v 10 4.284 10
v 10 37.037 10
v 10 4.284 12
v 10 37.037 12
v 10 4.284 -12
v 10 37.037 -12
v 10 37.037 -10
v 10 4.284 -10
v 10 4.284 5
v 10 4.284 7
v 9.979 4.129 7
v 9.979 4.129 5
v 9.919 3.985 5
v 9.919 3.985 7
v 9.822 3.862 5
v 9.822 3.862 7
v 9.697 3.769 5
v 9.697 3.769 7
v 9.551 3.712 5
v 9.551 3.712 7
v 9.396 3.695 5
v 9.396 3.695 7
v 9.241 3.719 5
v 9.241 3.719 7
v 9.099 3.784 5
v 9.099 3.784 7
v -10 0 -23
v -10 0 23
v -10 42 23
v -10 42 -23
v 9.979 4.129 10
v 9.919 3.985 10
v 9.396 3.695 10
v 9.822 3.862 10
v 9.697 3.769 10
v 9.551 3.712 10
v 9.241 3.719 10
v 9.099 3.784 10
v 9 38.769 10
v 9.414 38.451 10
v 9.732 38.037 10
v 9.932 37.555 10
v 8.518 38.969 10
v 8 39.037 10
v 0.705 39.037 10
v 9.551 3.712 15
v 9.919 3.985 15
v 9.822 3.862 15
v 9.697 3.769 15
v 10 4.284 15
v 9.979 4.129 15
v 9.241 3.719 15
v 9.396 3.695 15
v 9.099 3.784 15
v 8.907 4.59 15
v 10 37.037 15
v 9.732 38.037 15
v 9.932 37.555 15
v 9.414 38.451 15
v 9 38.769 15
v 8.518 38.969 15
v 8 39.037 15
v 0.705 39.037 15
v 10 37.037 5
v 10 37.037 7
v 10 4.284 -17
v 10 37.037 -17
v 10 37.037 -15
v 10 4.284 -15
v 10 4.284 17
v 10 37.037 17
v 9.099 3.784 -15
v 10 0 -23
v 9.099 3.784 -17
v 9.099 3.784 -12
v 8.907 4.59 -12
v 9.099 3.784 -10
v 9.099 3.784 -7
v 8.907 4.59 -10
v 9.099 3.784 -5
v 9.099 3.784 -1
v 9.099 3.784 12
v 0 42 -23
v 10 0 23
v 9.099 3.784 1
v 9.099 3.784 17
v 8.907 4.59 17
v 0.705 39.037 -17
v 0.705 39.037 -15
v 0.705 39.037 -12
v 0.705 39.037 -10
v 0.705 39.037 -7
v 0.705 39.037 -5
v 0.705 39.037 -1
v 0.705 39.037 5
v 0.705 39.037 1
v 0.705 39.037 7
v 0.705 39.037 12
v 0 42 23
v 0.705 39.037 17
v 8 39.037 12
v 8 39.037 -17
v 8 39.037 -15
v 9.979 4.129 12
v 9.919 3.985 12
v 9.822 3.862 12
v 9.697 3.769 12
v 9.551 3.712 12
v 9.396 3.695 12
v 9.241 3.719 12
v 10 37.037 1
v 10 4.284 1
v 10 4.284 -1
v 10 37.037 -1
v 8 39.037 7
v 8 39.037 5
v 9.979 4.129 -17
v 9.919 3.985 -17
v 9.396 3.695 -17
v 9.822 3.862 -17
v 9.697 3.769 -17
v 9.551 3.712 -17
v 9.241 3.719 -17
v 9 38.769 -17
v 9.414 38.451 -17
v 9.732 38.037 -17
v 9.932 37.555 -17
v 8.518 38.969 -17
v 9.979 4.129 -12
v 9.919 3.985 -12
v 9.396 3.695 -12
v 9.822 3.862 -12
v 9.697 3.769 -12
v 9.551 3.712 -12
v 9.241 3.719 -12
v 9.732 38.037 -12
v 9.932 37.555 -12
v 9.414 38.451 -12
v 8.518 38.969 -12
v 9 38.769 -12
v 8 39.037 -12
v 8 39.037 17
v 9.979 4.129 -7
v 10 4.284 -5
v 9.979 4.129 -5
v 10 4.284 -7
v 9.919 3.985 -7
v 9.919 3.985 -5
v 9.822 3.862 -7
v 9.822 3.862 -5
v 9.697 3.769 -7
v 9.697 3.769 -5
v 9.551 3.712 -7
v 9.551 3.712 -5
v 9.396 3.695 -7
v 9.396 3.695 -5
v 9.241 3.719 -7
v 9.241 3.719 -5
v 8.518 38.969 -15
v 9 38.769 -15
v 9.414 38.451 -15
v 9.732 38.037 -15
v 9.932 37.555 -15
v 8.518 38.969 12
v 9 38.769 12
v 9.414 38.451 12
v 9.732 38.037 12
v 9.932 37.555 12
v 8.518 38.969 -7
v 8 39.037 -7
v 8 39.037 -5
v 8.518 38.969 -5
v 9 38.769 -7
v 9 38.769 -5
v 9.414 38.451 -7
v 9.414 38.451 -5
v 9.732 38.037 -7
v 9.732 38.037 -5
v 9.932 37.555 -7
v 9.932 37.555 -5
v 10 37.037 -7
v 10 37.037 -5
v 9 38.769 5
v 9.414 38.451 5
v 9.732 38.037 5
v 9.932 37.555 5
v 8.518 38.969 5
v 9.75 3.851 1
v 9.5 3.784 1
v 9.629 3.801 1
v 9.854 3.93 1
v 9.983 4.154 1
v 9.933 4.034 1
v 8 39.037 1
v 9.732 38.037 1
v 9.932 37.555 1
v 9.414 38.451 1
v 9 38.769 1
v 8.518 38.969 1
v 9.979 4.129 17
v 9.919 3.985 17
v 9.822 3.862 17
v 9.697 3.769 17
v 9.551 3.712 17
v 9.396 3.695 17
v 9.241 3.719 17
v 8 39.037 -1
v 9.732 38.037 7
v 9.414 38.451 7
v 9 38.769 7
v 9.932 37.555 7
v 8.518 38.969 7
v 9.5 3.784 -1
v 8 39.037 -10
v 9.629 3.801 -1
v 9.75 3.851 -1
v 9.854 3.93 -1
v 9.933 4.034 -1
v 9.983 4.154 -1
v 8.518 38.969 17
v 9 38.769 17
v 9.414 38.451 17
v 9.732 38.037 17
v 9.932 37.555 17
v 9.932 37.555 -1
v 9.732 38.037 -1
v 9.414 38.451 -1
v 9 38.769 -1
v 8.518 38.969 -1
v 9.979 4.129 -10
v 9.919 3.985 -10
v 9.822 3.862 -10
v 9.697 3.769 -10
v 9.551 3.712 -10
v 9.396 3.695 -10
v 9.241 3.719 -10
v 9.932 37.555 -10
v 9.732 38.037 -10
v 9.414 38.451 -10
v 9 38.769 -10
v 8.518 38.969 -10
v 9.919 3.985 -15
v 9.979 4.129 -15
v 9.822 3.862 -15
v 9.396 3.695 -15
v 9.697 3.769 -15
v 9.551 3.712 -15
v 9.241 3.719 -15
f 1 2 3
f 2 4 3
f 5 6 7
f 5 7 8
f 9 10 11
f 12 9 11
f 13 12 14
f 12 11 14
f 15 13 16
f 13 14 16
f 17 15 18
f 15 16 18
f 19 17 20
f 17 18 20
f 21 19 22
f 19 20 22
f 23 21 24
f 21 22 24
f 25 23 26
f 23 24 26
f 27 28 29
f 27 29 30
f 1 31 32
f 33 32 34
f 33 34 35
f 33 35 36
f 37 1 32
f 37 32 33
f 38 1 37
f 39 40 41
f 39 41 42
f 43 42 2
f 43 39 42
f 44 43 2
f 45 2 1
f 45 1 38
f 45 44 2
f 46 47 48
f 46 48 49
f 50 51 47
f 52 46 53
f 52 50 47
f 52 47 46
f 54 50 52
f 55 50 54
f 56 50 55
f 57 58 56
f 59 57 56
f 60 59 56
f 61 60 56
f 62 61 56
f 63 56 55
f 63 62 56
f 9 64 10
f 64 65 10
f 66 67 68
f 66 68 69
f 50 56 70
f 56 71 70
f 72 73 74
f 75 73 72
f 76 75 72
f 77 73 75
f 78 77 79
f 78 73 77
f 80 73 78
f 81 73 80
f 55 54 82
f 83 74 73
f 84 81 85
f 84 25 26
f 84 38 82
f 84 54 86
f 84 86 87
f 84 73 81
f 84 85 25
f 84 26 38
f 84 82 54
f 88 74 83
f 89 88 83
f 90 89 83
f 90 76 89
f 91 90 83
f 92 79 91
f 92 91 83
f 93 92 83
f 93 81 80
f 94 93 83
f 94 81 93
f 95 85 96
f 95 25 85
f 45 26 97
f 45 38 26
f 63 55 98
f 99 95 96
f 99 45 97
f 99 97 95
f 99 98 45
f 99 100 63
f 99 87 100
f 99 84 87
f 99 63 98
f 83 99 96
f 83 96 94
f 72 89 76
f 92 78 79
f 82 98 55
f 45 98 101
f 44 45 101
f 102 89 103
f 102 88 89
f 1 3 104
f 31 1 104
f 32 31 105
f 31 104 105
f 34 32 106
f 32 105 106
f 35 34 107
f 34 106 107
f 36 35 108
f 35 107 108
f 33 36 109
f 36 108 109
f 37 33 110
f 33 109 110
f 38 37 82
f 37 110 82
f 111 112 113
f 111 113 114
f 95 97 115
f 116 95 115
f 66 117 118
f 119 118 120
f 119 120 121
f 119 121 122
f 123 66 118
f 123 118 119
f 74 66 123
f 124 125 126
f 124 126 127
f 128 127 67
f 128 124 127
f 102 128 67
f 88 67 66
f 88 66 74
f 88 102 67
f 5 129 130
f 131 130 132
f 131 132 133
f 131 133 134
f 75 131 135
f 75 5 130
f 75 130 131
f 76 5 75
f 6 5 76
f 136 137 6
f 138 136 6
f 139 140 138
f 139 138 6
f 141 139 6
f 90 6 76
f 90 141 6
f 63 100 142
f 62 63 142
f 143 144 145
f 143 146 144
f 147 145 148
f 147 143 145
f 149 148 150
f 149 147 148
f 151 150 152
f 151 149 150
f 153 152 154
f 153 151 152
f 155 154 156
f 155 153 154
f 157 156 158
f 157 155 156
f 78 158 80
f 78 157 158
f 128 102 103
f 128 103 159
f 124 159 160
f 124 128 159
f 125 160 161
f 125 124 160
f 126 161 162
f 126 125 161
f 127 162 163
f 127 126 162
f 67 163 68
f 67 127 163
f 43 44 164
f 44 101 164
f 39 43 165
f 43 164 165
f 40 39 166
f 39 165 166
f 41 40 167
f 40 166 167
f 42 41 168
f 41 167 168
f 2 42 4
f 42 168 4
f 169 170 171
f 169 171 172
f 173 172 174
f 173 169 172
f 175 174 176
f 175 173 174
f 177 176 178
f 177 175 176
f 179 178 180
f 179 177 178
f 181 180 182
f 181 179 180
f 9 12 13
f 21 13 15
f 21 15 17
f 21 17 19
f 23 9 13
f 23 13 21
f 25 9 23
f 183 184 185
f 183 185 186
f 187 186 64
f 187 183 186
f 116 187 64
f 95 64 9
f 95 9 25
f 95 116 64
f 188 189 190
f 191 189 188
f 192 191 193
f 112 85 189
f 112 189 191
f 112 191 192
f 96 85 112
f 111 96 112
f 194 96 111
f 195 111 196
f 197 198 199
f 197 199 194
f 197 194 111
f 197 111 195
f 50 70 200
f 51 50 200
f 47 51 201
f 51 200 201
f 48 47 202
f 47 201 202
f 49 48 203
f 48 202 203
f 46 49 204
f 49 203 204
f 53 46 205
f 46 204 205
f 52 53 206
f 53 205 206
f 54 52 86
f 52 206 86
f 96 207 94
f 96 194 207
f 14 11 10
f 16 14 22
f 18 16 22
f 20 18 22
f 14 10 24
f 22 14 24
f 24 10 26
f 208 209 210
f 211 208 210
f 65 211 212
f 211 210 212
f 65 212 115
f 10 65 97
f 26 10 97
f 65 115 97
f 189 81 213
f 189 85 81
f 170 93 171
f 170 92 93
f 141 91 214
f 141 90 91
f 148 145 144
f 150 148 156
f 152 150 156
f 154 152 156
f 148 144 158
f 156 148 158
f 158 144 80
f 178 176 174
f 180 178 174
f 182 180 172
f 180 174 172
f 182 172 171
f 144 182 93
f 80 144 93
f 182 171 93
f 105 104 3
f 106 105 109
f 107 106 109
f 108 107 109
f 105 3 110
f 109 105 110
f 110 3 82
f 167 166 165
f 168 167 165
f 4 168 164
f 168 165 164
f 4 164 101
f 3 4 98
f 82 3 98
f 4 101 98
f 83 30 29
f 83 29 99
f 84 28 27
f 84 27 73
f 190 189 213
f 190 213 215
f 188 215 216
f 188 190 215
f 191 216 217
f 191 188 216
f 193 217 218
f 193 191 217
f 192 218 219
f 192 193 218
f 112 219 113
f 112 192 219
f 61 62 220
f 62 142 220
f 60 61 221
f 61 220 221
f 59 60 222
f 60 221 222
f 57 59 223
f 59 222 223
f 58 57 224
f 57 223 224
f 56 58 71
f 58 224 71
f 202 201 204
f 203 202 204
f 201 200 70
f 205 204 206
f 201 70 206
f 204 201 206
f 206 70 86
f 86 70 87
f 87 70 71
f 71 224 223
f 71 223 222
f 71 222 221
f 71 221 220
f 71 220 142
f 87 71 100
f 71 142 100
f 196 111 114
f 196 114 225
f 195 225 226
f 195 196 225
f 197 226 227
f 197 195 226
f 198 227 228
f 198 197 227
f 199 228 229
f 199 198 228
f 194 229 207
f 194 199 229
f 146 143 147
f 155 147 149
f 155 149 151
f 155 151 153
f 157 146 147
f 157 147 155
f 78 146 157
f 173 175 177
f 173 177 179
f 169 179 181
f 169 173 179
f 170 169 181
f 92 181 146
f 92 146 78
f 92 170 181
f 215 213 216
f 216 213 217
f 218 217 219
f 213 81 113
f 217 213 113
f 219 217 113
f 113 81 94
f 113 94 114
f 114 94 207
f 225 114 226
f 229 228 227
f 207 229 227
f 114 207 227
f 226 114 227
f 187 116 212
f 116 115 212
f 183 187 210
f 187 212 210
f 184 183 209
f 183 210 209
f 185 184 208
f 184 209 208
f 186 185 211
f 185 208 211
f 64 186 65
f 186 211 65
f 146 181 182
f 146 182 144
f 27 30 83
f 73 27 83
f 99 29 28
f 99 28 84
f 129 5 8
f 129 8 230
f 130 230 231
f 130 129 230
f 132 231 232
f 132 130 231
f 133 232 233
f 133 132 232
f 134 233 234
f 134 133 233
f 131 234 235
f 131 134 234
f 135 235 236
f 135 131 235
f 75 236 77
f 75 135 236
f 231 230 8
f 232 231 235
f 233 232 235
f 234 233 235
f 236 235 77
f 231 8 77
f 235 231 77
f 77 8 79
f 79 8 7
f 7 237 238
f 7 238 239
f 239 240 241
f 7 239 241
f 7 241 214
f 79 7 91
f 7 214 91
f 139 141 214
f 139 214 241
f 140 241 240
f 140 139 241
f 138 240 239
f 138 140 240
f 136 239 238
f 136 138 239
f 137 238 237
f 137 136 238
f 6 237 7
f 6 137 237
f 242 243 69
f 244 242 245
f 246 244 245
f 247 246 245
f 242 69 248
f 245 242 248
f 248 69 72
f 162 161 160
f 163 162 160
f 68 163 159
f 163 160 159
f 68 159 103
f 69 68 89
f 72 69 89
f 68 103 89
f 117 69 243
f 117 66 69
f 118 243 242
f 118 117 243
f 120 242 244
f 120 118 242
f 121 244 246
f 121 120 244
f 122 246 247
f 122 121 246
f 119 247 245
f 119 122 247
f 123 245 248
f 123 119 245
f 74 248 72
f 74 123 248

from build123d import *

# Parameters (mm, degrees)
CROQUIS1_W               = 20
CROQUIS1_H               = 46
SALIENTE_EXTRUIR1_DEPTH  = 42
CORTAR_EXTRUIR1_DEPTH    = 64.087241182
SALIENTE_EXTRUIR4_DEPTH  = 1
SALIENTE_EXTRUIR5_DEPTH  = 1
SALIENTE_EXTRUIR6_DEPTH  = 1
SALIENTE_EXTRUIR7_DEPTH  = 1
SALIENTE_EXTRUIR8_DEPTH  = 1
SALIENTE_EXTRUIR9_DEPTH  = 1
SALIENTE_EXTRUIR10_DEPTH = 1


with BuildPart() as part:
    # Croquis1 → Saliente-Extruir1 (new body)
    with BuildSketch(Plane(origin=(0, 0, 0), x_dir=(1, 0, 0), z_dir=(0, 1, 0))):
        Rectangle(CROQUIS1_W, CROQUIS1_H)
    extrude(amount=SALIENTE_EXTRUIR1_DEPTH)

    # Croquis2 → Cortar-Extruir1 (cut, through all)
    with BuildSketch(Plane.XY.offset(23)):
        Polygon((10, 0), (-0.19167841, 42.803384109), (10, 42), align=None)
    extrude(amount=-CORTAR_EXTRUIR1_DEPTH, mode=Mode.SUBTRACT)

    # Croquis3 → Saliente-Extruir4 (add, symmetric)
    with BuildSketch(Plane.XY):
        with BuildLine():
            Line((9.099065282, 3.783778611), (9.5, 3.783778611))
            ThreePointArc((9.5, 3.783778611), (9.853553391, 3.93022522), (10, 4.283778611))
            Line((10, 4.283778611), (10, 37.037089462))
            ThreePointArc((10, 37.037089462), (9.414213562, 38.451303024), (8, 39.037089462))
            Line((8, 39.037089462), (0.705093297, 39.037089462))
            Line((0.705093297, 39.037089462), (9.099065282, 3.783778611))
        make_face()
    extrude(amount=SALIENTE_EXTRUIR4_DEPTH, both=True)

    # Croquis5 → Saliente-Extruir5 (add, symmetric)
    with BuildSketch(Plane.XY.offset(6)):
        with BuildLine():
            Line((0.705093297, 39.037089462), (8, 39.037089462))
            ThreePointArc((8, 39.037089462), (9.414213562, 38.451303024), (10, 37.037089462))
            Line((10, 37.037089462), (10, 4.283778611))
            ThreePointArc((10, 4.283778611), (9.696707623, 3.768588508), (9.099065282, 3.783778611))
            Line((9.099065282, 3.783778611), (0.705093297, 39.037089462))
        make_face()
    extrude(amount=SALIENTE_EXTRUIR5_DEPTH, both=True)

    # Croquis6 → Saliente-Extruir6 (add, symmetric)
    with BuildSketch(Plane.XY.offset(11)):
        with BuildLine():
            Line((0.705093297, 39.037089462), (8, 39.037089462))
            ThreePointArc((8, 39.037089462), (9.414213562, 38.451303024), (10, 37.037089462))
            Line((10, 37.037089462), (10, 4.283778611))
            ThreePointArc((10, 4.283778611), (9.696707623, 3.768588508), (9.099065282, 3.783778611))
            Line((9.099065282, 3.783778611), (0.705093297, 39.037089462))
        make_face()
    extrude(amount=SALIENTE_EXTRUIR6_DEPTH, both=True)

    # Croquis7 → Saliente-Extruir7 (add, symmetric)
    with BuildSketch(Plane.XY.offset(16)):
        with BuildLine():
            Line((0.705093297, 39.037089462), (8, 39.037089462))
            ThreePointArc((8, 39.037089462), (9.414213562, 38.451303024), (10, 37.037089462))
            Line((10, 37.037089462), (10, 4.283778611))
            ThreePointArc((10, 4.283778611), (9.251976893, 3.716372197), (8.907184659, 4.589645878))
            Line((8.907184659, 4.589645878), (0.705093297, 39.037089462))
        make_face()
    extrude(amount=SALIENTE_EXTRUIR7_DEPTH, both=True)

    # Croquis9 → Saliente-Extruir8 (add, symmetric)
    with BuildSketch(Plane(origin=(0, 0, -6), x_dir=(-1, 0, 0), z_dir=(0, 0, -1))):
        with BuildLine():
            Line((-0.705093297, 39.037089462), (-8, 39.037089462))
            ThreePointArc((-8, 39.037089462), (-9.414213562, 38.451303024), (-10, 37.037089462))
            Line((-10, 37.037089462), (-10, 4.283778611))
            ThreePointArc((-10, 4.283778611), (-9.696707623, 3.768588508), (-9.099065282, 3.783778611))
            Line((-9.099065282, 3.783778611), (-0.705093297, 39.037089462))
        make_face()
    extrude(amount=SALIENTE_EXTRUIR8_DEPTH, both=True)

    # Croquis10 → Saliente-Extruir9 (add, symmetric)
    with BuildSketch(Plane(origin=(0, 0, -11), x_dir=(-1, 0, 0), z_dir=(0, 0, -1))):
        with BuildLine():
            Line((-0.705093297, 39.037089462), (-8, 39.037089462))
            ThreePointArc((-8, 39.037089462), (-9.414213562, 38.451303024), (-10, 37.037089462))
            Line((-10, 37.037089462), (-10, 4.283778611))
            ThreePointArc((-10, 4.283778611), (-9.696707623, 3.768588508), (-9.099065282, 3.783778611))
            Line((-9.099065282, 3.783778611), (-8.907184659, 4.589645878))
            Line((-8.907184659, 4.589645878), (-0.705093297, 39.037089462))
        make_face()
    extrude(amount=SALIENTE_EXTRUIR9_DEPTH, both=True)

    # Croquis11 → Saliente-Extruir10 (add, symmetric)
    with BuildSketch(Plane(origin=(0, 0, -16), x_dir=(-1, 0, 0), z_dir=(0, 0, -1))):
        with BuildLine():
            Line((-0.705093297, 39.037089462), (-8, 39.037089462))
            ThreePointArc((-8, 39.037089462), (-9.414213562, 38.451303024), (-10, 37.037089462))
            Line((-10, 37.037089462), (-10, 4.283778611))
            ThreePointArc((-10, 4.283778611), (-9.696707623, 3.768588508), (-9.099065282, 3.783778611))
            Line((-9.099065282, 3.783778611), (-0.705093297, 39.037089462))
        make_face()
    extrude(amount=SALIENTE_EXTRUIR10_DEPTH, both=True)


solid = part.part
